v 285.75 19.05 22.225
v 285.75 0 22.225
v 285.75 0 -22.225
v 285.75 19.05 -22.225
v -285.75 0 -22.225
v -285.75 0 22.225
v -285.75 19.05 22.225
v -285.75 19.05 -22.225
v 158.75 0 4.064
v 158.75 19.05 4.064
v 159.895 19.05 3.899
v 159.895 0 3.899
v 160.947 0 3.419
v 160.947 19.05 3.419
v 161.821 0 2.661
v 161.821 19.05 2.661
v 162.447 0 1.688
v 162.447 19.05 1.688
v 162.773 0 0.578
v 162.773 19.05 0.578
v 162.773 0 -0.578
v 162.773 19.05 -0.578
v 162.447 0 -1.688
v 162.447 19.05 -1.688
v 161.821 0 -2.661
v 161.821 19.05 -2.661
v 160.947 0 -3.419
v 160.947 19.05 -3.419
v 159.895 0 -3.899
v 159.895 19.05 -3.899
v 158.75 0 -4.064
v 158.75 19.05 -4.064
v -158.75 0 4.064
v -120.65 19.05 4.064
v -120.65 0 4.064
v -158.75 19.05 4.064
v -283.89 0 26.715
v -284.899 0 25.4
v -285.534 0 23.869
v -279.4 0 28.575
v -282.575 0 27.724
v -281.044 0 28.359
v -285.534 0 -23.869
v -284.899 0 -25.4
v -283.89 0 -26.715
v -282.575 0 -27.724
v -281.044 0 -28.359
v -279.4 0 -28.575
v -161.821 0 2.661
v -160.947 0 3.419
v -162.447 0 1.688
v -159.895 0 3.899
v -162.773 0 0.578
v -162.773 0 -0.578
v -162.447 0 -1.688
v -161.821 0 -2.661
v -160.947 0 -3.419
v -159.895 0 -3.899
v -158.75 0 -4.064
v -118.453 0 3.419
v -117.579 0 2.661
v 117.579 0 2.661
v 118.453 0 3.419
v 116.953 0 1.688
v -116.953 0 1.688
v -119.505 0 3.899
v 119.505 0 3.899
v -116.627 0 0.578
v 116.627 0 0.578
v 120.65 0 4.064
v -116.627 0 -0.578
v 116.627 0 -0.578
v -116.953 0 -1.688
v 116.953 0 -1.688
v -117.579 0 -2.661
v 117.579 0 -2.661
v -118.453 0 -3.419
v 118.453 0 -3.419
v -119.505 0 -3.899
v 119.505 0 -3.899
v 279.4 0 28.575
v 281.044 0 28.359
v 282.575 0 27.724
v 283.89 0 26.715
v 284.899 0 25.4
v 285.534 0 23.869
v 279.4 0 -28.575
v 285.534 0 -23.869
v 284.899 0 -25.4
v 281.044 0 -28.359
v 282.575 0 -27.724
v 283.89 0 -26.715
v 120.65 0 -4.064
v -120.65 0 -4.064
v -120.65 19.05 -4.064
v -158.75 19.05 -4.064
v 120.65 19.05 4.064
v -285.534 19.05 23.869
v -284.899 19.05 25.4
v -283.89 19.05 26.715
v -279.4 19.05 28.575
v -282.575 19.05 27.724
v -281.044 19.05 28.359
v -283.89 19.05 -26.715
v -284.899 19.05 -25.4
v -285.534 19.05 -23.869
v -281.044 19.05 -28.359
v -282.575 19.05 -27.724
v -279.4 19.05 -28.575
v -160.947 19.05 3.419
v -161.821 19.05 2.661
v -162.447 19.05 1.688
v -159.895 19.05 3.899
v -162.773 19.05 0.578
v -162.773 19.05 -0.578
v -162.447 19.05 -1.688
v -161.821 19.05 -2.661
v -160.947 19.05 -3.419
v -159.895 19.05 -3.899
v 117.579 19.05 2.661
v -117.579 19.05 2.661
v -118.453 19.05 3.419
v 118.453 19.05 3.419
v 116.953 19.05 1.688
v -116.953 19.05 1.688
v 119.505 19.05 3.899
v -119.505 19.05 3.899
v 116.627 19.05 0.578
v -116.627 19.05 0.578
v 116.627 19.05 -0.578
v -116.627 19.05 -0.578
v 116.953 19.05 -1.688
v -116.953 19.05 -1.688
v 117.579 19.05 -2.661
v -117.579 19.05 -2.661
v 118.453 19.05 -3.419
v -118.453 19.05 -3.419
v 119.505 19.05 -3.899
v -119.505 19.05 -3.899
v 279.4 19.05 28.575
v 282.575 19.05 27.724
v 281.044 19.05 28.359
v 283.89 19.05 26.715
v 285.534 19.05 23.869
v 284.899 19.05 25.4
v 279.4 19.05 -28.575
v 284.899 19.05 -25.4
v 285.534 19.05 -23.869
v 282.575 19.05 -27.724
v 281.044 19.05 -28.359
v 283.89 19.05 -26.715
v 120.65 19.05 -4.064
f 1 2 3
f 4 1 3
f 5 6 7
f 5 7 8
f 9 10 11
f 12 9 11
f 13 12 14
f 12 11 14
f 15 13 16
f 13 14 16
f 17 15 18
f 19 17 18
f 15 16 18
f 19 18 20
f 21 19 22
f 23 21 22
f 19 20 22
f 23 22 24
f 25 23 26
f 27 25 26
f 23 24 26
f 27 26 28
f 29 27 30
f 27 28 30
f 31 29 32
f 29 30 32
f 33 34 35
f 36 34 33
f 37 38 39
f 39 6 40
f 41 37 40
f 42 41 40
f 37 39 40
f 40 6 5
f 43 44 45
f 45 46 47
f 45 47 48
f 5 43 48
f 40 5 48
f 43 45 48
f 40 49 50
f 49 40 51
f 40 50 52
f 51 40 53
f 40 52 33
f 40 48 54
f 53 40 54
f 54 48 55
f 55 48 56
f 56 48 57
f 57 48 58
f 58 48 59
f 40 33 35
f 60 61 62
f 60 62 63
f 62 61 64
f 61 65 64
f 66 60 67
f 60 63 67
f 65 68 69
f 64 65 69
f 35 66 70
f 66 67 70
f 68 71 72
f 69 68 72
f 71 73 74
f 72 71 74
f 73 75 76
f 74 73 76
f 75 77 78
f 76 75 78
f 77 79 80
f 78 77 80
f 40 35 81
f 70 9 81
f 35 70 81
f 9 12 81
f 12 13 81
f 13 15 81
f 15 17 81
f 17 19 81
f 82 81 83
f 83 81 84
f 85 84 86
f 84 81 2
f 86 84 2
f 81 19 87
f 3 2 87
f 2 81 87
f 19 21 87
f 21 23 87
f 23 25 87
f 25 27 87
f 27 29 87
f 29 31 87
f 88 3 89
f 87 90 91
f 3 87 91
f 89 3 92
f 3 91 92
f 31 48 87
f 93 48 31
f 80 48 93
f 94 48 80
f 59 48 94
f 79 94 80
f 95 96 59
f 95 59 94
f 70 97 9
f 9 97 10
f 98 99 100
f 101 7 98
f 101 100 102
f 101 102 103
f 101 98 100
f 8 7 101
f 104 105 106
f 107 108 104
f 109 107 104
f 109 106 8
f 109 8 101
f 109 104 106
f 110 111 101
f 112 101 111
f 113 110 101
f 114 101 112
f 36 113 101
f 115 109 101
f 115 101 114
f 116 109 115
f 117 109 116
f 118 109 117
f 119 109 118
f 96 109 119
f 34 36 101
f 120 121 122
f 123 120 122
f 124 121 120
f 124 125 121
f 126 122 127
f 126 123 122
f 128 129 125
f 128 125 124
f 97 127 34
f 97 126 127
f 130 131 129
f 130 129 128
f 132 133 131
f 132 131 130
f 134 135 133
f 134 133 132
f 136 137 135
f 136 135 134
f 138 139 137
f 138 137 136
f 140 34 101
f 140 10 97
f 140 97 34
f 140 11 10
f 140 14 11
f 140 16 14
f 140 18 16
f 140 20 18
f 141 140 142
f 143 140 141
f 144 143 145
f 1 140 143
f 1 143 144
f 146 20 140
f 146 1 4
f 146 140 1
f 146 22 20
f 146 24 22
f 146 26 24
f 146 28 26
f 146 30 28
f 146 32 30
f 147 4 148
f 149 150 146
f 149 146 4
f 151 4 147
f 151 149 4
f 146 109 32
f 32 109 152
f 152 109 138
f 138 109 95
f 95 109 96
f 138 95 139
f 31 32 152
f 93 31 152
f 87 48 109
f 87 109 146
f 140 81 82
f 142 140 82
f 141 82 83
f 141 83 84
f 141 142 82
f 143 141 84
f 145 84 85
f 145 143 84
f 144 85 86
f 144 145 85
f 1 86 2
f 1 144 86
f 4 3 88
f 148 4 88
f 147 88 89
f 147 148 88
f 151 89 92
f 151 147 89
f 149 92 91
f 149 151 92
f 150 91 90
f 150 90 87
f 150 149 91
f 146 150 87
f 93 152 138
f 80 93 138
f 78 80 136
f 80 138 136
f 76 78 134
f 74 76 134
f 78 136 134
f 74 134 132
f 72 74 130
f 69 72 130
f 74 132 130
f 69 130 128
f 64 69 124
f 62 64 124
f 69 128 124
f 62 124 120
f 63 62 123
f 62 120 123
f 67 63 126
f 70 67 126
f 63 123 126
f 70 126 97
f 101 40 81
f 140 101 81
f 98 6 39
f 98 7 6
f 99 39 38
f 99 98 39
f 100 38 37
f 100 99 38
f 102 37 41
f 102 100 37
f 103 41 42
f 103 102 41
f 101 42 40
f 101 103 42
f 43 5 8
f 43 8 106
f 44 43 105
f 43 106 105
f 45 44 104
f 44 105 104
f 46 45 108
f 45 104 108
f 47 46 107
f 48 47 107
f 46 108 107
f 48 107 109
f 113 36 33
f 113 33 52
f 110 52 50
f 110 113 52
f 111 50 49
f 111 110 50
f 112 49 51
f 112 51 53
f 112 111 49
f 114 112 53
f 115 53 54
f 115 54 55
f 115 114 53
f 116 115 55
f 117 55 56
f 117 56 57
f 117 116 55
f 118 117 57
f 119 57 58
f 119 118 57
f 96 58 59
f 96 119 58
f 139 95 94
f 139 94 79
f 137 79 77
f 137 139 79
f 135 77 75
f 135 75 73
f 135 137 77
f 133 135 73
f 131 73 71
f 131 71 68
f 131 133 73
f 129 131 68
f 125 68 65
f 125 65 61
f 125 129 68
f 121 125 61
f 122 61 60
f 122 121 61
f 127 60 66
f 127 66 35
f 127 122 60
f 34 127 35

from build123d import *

# Parameters (mm, degrees)
SKETCH1_W           = 571.5
SKETCH1_H           = 57.15
BOSS_EXTRUDE1_DEPTH = 19.05
FILLET1_R           = 6.35
CUT_EXTRUDE1_DEPTH  = 19.05


with BuildPart() as part:
    # Sketch1 → Boss-Extrude1 (new body)
    with BuildSketch(Plane(origin=(0, 0, 0), x_dir=(1, 0, 0), z_dir=(0, 1, 0))):
        Rectangle(SKETCH1_W, SKETCH1_H)
    extrude(amount=BOSS_EXTRUDE1_DEPTH)

    # Fillet1
    fillet1_edges = [part.edges().sort_by_distance(p)[0] for p in [
        (-285.75, 9.525, -28.575),
        (285.75, 9.525, -28.575),
        (285.75, 9.525, 28.575),
        (-285.75, 9.525, 28.575),
    ]]
    fillet(fillet1_edges, radius=FILLET1_R)

    # Sketch2 → Cut-Extrude1 (cut)
    with BuildSketch(Plane(origin=(0, 19.05, 0), x_dir=(1, 0, 0), z_dir=(0, 1, 0))):
        with BuildLine():
            Line((-120.65, -4.064), (-158.75, -4.064))
            ThreePointArc((-158.75, -4.064), (-162.814, 0), (-158.75, 4.064))
            Line((-158.75, 4.064), (-120.65, 4.064))
            ThreePointArc((-120.65, 4.064), (-116.586, 0), (-120.65, -4.064))
        make_face()
        with BuildLine():
            Line((120.65, -4.064), (158.75, -4.064))
            ThreePointArc((158.75, -4.064), (162.814, 0), (158.75, 4.064))
            Line((158.75, 4.064), (120.65, 4.064))
            ThreePointArc((120.65, 4.064), (116.586, 0), (120.65, -4.064))
        make_face()
    extrude(amount=-CUT_EXTRUDE1_DEPTH, mode=Mode.SUBTRACT)


solid = part.part
